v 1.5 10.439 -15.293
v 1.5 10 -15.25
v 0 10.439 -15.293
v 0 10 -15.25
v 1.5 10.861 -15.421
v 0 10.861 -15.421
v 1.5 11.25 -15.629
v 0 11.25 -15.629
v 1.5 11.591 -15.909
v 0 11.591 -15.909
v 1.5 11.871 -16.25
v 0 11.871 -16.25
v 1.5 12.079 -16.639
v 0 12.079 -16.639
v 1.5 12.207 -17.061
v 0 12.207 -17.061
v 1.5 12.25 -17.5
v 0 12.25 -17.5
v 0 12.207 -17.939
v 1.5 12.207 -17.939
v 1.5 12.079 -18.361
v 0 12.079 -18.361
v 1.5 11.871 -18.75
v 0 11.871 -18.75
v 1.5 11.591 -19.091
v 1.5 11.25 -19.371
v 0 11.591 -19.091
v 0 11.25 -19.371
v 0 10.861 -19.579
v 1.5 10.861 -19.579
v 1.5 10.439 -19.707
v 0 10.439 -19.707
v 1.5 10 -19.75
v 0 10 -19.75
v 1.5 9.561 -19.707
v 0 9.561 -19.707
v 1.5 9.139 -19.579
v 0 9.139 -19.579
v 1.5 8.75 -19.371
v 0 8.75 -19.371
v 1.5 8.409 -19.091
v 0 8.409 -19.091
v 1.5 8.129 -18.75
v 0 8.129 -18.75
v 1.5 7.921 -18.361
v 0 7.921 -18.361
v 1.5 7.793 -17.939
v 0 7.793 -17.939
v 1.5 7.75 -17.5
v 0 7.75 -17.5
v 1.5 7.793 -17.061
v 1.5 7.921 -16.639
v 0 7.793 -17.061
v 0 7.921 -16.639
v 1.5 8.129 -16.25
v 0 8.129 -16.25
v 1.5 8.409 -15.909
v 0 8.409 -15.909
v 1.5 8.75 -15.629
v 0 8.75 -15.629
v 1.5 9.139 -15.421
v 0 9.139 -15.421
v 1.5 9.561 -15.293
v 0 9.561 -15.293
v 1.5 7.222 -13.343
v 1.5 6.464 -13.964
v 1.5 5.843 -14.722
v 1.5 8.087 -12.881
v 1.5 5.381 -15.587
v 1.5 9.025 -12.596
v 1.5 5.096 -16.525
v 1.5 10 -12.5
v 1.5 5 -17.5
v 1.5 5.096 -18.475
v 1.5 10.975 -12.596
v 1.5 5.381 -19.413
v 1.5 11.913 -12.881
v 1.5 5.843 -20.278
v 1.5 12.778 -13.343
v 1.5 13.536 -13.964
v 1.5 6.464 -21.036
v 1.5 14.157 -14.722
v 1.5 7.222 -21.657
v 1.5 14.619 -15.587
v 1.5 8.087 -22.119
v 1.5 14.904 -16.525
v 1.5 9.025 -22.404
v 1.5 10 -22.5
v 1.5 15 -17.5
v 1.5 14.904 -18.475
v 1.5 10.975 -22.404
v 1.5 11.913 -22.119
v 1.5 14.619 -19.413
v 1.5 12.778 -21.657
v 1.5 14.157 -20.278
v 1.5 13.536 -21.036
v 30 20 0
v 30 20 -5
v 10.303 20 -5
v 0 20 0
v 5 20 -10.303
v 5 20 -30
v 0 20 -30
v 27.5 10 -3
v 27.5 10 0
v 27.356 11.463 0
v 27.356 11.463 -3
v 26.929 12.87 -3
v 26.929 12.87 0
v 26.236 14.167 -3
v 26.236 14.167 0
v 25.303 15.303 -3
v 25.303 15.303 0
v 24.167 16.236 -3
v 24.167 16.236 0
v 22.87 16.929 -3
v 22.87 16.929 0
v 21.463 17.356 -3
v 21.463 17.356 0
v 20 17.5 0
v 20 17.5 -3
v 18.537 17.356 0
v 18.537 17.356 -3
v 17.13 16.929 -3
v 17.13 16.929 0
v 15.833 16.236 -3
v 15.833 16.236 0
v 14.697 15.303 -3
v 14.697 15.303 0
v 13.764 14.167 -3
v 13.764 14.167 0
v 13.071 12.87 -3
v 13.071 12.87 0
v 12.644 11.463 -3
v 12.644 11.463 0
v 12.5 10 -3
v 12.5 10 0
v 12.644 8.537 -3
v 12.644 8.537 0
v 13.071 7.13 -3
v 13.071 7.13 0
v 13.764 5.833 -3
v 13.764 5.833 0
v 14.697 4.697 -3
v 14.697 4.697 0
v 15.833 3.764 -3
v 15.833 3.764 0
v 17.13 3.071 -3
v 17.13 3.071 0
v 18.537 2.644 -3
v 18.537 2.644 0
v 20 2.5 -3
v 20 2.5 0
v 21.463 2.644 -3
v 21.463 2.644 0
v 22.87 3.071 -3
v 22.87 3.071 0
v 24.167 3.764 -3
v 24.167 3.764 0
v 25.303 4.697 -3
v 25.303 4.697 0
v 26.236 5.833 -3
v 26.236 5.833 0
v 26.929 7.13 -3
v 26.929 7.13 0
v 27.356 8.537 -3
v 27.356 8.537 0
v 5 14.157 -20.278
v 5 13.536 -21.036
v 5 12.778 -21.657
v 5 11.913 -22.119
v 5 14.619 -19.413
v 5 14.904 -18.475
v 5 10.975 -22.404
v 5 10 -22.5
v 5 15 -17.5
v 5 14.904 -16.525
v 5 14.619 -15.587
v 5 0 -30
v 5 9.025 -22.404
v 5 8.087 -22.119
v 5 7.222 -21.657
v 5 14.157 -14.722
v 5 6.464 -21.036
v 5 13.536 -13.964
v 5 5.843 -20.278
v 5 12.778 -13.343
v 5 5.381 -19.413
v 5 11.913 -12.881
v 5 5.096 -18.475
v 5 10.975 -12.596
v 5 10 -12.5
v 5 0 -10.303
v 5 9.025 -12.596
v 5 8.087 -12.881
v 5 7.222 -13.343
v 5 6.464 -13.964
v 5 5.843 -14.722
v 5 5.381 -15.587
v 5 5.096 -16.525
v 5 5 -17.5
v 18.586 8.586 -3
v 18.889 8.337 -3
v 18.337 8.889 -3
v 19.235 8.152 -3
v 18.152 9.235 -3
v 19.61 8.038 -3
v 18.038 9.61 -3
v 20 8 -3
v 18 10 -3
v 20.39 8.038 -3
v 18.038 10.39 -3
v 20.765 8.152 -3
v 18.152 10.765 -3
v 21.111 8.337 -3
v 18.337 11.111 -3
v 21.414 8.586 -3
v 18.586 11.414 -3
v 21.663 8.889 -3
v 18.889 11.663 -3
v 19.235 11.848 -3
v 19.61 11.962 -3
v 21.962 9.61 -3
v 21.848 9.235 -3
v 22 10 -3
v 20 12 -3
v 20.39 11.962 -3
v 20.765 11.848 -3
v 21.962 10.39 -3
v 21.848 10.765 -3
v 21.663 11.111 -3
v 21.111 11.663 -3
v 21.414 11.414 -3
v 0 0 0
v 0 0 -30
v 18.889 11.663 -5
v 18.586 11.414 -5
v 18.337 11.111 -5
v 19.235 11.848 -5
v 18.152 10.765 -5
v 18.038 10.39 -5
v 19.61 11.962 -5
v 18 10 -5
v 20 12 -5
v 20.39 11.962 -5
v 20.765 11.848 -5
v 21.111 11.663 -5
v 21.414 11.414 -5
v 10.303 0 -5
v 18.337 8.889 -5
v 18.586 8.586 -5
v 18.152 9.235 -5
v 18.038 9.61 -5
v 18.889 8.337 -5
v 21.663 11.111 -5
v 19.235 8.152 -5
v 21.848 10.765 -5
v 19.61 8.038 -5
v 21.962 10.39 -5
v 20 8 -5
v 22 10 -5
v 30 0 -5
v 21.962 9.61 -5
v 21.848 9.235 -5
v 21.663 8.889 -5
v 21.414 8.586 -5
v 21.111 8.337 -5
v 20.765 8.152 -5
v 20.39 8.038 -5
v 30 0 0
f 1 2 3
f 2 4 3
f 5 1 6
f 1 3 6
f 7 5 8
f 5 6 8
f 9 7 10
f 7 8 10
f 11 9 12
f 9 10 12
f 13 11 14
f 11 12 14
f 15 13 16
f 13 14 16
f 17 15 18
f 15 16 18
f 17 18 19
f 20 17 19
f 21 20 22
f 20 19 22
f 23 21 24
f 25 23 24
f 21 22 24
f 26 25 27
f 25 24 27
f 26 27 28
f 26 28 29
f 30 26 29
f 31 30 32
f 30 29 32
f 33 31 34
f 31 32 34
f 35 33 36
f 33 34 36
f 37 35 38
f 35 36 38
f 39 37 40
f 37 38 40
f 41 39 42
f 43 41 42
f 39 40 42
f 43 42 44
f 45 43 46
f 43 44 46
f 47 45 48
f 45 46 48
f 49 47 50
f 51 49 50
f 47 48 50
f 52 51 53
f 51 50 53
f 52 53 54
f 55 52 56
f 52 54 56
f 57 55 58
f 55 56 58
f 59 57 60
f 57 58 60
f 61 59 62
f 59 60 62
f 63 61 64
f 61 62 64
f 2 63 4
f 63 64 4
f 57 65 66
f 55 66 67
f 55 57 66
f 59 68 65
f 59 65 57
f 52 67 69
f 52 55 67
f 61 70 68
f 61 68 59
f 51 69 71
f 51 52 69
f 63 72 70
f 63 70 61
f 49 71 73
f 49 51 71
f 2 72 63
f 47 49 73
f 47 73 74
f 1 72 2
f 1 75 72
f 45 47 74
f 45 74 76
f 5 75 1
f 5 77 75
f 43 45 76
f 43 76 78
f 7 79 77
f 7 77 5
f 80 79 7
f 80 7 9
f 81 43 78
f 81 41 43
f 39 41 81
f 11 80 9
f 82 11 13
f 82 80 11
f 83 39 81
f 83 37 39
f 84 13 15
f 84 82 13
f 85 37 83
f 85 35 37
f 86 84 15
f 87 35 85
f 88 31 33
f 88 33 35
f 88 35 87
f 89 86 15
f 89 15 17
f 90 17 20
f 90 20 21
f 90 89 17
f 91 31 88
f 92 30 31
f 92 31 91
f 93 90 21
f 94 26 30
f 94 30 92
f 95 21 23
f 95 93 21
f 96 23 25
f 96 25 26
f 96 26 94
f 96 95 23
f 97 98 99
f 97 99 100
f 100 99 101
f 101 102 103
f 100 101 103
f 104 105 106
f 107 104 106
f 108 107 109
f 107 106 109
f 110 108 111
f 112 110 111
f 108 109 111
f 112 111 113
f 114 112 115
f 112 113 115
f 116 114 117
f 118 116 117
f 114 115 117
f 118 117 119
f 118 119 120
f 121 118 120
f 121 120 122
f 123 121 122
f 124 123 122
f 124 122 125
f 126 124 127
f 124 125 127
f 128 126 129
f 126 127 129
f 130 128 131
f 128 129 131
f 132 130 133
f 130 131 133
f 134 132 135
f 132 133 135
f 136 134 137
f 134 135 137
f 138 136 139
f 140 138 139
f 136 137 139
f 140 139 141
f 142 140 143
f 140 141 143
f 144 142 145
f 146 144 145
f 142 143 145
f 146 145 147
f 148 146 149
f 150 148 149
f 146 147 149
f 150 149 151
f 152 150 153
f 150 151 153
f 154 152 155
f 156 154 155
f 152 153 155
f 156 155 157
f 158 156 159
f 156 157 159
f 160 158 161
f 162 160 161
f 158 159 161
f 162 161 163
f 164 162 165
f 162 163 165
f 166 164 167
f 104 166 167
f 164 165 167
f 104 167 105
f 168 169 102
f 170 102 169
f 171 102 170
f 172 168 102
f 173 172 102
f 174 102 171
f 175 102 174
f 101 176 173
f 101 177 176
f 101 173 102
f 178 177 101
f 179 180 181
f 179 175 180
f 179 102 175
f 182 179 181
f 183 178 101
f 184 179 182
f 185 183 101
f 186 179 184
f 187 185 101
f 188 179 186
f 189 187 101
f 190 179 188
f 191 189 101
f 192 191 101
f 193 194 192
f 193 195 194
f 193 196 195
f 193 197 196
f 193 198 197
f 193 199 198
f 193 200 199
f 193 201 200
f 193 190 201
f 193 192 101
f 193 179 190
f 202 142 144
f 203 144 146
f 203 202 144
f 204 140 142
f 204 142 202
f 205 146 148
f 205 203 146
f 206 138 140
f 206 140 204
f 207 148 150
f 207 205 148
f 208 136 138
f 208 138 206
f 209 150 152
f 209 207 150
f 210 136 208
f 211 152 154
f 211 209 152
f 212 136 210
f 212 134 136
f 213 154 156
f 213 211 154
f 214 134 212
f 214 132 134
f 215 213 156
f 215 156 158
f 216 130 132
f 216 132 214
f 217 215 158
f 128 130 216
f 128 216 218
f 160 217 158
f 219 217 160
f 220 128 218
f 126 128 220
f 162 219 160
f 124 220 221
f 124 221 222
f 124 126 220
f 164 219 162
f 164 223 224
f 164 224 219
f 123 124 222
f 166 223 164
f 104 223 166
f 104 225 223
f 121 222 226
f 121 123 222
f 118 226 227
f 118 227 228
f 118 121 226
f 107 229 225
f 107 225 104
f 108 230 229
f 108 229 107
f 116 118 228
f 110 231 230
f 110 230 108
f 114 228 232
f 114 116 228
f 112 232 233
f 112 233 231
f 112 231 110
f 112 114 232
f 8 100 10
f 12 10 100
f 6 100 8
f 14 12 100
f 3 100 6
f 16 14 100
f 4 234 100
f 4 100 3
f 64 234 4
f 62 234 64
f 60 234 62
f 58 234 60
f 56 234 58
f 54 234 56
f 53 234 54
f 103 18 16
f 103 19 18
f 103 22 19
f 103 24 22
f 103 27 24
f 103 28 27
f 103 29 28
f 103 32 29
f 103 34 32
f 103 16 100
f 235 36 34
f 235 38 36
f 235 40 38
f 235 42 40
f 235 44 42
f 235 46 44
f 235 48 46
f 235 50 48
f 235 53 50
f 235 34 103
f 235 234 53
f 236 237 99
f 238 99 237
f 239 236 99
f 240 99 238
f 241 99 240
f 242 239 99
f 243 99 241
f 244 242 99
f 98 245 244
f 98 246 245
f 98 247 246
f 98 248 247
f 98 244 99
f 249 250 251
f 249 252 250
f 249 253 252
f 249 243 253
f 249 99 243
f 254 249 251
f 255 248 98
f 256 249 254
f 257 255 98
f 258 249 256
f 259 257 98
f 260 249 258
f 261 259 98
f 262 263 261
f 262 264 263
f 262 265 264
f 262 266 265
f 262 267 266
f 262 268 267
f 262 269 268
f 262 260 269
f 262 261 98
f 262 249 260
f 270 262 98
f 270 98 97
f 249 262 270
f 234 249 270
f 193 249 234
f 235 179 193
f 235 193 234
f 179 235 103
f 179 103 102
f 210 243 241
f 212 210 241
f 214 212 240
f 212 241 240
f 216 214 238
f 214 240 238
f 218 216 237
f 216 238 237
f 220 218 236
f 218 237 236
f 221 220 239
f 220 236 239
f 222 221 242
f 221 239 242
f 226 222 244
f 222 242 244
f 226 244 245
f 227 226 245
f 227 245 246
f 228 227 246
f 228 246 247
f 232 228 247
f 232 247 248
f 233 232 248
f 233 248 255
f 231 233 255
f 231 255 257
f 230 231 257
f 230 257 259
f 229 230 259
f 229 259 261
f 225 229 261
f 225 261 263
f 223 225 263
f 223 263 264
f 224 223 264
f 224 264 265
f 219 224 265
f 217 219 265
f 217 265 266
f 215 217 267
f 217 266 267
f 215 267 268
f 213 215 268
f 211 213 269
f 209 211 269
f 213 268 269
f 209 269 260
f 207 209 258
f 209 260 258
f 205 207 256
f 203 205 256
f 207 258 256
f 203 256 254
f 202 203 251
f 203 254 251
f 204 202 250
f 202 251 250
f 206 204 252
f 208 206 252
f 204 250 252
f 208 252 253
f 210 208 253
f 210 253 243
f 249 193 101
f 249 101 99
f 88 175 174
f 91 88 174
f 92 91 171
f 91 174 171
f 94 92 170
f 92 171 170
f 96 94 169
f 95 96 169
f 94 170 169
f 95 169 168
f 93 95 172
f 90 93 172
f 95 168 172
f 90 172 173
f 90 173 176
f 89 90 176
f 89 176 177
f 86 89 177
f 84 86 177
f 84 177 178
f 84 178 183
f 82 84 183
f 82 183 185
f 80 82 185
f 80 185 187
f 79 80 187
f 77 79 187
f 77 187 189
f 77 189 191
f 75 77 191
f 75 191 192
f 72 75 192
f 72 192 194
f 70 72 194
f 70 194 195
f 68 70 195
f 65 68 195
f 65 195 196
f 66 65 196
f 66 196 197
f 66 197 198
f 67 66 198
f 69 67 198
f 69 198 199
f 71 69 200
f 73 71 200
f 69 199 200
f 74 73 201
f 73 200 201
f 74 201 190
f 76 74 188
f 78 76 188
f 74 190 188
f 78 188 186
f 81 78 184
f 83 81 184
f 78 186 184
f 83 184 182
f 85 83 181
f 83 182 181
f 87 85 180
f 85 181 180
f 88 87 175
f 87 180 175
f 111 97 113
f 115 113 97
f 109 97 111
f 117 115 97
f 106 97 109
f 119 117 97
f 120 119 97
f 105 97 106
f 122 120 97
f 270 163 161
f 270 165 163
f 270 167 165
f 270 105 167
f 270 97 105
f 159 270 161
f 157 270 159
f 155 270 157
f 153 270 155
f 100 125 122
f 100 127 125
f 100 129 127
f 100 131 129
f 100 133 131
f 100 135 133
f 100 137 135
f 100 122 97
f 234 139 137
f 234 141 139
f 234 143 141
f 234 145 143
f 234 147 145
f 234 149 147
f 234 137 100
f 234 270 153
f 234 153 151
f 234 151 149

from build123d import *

# Parameters (mm, degrees)
ESTRUSIONE_ESTRUSIONE2_DEPTH                         = 20
FORO_LAMATO_PER_VITE_M4_A_TESTA_CILINDRI_D           = 4.5
FORO_LAMATO_PER_VITE_M4_A_TESTA_CILINDRI_DEPTH       = 15
FORO_LAMATO_PER_VITE_M4_A_TESTA_CILINDRI_CBORE_D     = 10
FORO_LAMATO_PER_VITE_M4_A_TESTA_CILINDRI_CBORE_DEPTH = 3.5
FORO_LAMATO_PER_VITE_M4_A_TESTA_CILINDRI_TIP         = 1.351936393
SCHIZZO6_R                                           = 7.5
TAGLIO_ESTRUSIONE1_DEPTH                             = 3
FORO_PER_VITE_M4_1_D                                 = 4
FORO_PER_VITE_M4_1_DEPTH                             = 9
FORO_PER_VITE_M4_1_TIP                               = 1.201721238


with BuildPart() as part:
    # Schizzo2 → Estrusione-Estrusione2 (new body)
    with BuildSketch(Plane(origin=(0, 0, 0), x_dir=(1, 0, 0), z_dir=(0, 1, 0))):
        Polygon((5, 30), (5, 10.303300859), (10.303300859, 5), (30, 5), (30, 0), (0, 0), (0, 30), align=None)
    extrude(amount=ESTRUSIONE_ESTRUSIONE2_DEPTH)

    # Foro lamato per Vite M4 a testa cilindrica piana-1
    with Locations(Plane(origin=(5, 0, 0), x_dir=(0, 0, -1), z_dir=(1, 0, 0))):
        with Locations((17.5, 10)):
            CounterBoreHole(FORO_LAMATO_PER_VITE_M4_A_TESTA_CILINDRI_D / 2, FORO_LAMATO_PER_VITE_M4_A_TESTA_CILINDRI_CBORE_D / 2, FORO_LAMATO_PER_VITE_M4_A_TESTA_CILINDRI_CBORE_DEPTH, depth=FORO_LAMATO_PER_VITE_M4_A_TESTA_CILINDRI_DEPTH)
            with Locations((0, 0, -(FORO_LAMATO_PER_VITE_M4_A_TESTA_CILINDRI_DEPTH + FORO_LAMATO_PER_VITE_M4_A_TESTA_CILINDRI_TIP / 2))):  # 118° drill point
                Cone(0, FORO_LAMATO_PER_VITE_M4_A_TESTA_CILINDRI_D / 2, FORO_LAMATO_PER_VITE_M4_A_TESTA_CILINDRI_TIP, mode=Mode.SUBTRACT)

    # Schizzo6 → Taglio-Estrusione1 (cut)
    with BuildSketch(Plane.XY):
        with Locations((20, 10)):
            Circle(SCHIZZO6_R)
    extrude(amount=-TAGLIO_ESTRUSIONE1_DEPTH, mode=Mode.SUBTRACT)

    # Foro per Vite M4-1
    with Locations(Plane(origin=(20, 10, 0), x_dir=(1, 0, 0), z_dir=(0, 0, 1))):
        with Locations((0, 0)):
            Hole(FORO_PER_VITE_M4_1_D / 2, depth=FORO_PER_VITE_M4_1_DEPTH)
            with Locations((0, 0, -(FORO_PER_VITE_M4_1_DEPTH + FORO_PER_VITE_M4_1_TIP / 2))):  # 118° drill point
                Cone(0, FORO_PER_VITE_M4_1_D / 2, FORO_PER_VITE_M4_1_TIP, mode=Mode.SUBTRACT)


solid = part.part
